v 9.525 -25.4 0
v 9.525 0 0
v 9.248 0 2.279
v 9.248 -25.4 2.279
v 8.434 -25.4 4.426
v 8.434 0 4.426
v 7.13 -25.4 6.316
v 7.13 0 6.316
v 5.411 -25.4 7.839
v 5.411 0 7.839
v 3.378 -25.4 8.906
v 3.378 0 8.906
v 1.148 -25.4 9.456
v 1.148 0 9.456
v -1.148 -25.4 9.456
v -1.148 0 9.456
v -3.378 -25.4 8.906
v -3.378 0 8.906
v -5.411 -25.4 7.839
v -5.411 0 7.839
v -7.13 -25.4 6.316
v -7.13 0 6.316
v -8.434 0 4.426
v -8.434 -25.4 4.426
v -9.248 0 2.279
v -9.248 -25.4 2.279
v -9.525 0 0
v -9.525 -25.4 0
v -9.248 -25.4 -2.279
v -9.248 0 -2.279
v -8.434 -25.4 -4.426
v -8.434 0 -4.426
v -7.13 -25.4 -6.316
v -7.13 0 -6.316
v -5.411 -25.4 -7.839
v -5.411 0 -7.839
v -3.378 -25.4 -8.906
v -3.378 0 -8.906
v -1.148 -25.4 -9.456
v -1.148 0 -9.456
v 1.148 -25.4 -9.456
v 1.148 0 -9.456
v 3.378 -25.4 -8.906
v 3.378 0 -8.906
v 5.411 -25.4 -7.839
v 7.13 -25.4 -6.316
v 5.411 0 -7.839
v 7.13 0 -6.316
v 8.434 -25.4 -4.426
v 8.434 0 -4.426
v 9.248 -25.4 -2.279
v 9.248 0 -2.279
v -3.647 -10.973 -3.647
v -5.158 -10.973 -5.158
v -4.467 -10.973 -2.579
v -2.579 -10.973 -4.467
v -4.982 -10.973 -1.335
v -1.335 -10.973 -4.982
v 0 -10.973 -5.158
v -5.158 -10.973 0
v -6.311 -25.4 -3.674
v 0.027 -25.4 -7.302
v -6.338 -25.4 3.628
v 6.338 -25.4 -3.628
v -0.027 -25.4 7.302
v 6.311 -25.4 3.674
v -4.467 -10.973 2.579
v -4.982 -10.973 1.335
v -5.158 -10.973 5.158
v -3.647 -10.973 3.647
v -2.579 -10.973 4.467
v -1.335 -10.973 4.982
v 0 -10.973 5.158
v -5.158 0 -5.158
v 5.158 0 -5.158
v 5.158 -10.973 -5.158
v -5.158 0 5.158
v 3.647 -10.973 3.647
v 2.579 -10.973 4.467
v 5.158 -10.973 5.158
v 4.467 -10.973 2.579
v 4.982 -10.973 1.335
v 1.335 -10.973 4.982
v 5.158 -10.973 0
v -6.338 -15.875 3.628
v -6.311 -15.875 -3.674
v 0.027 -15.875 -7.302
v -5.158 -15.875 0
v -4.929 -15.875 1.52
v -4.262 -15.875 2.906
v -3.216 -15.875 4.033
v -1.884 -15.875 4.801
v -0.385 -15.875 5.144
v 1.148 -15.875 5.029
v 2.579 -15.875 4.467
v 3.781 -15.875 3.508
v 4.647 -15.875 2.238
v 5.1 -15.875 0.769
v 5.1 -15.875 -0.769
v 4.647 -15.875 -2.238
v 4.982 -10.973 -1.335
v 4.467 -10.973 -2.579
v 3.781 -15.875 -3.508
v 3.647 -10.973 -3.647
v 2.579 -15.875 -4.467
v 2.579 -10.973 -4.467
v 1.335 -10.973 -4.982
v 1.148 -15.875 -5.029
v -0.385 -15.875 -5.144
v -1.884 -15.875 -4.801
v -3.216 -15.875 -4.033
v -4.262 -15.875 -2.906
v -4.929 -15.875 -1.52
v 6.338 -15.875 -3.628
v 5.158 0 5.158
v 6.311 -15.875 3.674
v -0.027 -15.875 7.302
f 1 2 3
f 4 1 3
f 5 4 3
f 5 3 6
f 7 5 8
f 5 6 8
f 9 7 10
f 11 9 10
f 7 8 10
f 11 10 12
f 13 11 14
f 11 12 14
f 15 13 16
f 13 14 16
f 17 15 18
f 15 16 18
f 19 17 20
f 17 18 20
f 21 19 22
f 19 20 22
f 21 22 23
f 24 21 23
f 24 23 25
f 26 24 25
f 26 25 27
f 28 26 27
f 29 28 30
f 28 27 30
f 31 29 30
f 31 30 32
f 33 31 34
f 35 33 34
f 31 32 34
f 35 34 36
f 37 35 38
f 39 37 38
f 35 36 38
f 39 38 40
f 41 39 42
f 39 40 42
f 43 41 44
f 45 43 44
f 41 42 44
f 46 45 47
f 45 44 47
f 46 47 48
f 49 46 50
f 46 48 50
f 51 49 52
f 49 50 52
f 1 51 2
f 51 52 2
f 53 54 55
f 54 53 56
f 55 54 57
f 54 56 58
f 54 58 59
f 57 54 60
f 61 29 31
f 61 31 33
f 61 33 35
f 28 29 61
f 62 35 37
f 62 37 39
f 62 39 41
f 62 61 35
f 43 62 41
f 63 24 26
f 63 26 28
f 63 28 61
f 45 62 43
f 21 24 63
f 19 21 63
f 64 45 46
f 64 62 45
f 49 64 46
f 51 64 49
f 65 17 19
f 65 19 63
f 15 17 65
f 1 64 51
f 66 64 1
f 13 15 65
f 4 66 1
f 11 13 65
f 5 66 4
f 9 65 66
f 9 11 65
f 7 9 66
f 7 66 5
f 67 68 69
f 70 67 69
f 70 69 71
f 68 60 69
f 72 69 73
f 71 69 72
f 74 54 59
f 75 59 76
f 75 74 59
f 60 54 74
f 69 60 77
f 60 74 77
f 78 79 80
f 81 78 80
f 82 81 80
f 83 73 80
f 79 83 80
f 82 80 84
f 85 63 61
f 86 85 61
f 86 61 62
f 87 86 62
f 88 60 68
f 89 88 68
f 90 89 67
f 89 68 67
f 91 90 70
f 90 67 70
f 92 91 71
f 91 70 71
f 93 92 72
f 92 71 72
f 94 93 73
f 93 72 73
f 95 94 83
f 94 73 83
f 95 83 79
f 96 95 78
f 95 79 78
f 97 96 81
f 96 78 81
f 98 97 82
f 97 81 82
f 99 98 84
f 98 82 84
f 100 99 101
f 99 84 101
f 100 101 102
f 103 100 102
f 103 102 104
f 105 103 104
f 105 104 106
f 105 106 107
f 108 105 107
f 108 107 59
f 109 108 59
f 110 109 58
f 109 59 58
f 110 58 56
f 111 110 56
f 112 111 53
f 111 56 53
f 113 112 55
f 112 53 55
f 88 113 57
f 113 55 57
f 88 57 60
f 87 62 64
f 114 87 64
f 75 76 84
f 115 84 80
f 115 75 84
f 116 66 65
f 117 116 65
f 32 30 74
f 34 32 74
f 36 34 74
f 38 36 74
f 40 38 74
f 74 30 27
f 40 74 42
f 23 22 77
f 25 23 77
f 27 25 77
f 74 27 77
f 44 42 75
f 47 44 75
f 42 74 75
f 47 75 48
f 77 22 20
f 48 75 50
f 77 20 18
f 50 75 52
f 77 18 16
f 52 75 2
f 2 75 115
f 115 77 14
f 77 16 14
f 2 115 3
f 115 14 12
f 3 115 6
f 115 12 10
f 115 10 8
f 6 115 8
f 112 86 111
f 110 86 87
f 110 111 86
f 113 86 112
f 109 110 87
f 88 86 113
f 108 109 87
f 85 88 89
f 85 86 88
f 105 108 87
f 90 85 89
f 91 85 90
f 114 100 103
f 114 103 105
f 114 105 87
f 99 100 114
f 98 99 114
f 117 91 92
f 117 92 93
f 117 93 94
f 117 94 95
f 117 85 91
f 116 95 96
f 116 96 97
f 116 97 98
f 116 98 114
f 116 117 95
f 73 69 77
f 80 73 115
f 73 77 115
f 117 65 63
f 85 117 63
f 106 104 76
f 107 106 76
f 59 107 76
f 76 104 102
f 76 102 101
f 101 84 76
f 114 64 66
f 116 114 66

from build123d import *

# Parameters (mm, degrees)
F0_R     = 9.525
F1_DEPTH = 25.4
F3_DEPTH = 9.525
F5_W     = 10.315952
F5_H     = 10.315952
F6_DEPTH = 10.9728
F4_R     = 5.157976
F7_DEPTH = 25.401


with BuildPart() as f1:
    # F0 (on Front) → F1 (new body)
    with BuildSketch(Plane.XZ):
        Circle(F0_R)
    extrude(amount=F1_DEPTH)

    # F2 (on face) → F3 (cut)
    with BuildSketch(Plane.XZ.offset(25.4)):
        Polygon((6.310741, 3.674476), (-0.026819, 7.3025), (-6.33756, 3.628024), (-6.310741, -3.674476), (0.026819, -7.3025), (6.33756, -3.628024), align=None)
    extrude(amount=-F3_DEPTH, mode=Mode.SUBTRACT)

    # F5 (on Front) → F6 (cut)
    with BuildSketch(Plane.XZ):
        Rectangle(F5_W, F5_H)
    extrude(amount=F6_DEPTH, mode=Mode.SUBTRACT)

    # F4 (on face) → F7 (cut, through all)
    with BuildSketch(Plane(origin=(0, 0, 0), x_dir=(-1, 0, 0), z_dir=(0, 1, 0))):
        Circle(F4_R)
    extrude(amount=-F7_DEPTH, mode=Mode.SUBTRACT)


solid = f1.part
